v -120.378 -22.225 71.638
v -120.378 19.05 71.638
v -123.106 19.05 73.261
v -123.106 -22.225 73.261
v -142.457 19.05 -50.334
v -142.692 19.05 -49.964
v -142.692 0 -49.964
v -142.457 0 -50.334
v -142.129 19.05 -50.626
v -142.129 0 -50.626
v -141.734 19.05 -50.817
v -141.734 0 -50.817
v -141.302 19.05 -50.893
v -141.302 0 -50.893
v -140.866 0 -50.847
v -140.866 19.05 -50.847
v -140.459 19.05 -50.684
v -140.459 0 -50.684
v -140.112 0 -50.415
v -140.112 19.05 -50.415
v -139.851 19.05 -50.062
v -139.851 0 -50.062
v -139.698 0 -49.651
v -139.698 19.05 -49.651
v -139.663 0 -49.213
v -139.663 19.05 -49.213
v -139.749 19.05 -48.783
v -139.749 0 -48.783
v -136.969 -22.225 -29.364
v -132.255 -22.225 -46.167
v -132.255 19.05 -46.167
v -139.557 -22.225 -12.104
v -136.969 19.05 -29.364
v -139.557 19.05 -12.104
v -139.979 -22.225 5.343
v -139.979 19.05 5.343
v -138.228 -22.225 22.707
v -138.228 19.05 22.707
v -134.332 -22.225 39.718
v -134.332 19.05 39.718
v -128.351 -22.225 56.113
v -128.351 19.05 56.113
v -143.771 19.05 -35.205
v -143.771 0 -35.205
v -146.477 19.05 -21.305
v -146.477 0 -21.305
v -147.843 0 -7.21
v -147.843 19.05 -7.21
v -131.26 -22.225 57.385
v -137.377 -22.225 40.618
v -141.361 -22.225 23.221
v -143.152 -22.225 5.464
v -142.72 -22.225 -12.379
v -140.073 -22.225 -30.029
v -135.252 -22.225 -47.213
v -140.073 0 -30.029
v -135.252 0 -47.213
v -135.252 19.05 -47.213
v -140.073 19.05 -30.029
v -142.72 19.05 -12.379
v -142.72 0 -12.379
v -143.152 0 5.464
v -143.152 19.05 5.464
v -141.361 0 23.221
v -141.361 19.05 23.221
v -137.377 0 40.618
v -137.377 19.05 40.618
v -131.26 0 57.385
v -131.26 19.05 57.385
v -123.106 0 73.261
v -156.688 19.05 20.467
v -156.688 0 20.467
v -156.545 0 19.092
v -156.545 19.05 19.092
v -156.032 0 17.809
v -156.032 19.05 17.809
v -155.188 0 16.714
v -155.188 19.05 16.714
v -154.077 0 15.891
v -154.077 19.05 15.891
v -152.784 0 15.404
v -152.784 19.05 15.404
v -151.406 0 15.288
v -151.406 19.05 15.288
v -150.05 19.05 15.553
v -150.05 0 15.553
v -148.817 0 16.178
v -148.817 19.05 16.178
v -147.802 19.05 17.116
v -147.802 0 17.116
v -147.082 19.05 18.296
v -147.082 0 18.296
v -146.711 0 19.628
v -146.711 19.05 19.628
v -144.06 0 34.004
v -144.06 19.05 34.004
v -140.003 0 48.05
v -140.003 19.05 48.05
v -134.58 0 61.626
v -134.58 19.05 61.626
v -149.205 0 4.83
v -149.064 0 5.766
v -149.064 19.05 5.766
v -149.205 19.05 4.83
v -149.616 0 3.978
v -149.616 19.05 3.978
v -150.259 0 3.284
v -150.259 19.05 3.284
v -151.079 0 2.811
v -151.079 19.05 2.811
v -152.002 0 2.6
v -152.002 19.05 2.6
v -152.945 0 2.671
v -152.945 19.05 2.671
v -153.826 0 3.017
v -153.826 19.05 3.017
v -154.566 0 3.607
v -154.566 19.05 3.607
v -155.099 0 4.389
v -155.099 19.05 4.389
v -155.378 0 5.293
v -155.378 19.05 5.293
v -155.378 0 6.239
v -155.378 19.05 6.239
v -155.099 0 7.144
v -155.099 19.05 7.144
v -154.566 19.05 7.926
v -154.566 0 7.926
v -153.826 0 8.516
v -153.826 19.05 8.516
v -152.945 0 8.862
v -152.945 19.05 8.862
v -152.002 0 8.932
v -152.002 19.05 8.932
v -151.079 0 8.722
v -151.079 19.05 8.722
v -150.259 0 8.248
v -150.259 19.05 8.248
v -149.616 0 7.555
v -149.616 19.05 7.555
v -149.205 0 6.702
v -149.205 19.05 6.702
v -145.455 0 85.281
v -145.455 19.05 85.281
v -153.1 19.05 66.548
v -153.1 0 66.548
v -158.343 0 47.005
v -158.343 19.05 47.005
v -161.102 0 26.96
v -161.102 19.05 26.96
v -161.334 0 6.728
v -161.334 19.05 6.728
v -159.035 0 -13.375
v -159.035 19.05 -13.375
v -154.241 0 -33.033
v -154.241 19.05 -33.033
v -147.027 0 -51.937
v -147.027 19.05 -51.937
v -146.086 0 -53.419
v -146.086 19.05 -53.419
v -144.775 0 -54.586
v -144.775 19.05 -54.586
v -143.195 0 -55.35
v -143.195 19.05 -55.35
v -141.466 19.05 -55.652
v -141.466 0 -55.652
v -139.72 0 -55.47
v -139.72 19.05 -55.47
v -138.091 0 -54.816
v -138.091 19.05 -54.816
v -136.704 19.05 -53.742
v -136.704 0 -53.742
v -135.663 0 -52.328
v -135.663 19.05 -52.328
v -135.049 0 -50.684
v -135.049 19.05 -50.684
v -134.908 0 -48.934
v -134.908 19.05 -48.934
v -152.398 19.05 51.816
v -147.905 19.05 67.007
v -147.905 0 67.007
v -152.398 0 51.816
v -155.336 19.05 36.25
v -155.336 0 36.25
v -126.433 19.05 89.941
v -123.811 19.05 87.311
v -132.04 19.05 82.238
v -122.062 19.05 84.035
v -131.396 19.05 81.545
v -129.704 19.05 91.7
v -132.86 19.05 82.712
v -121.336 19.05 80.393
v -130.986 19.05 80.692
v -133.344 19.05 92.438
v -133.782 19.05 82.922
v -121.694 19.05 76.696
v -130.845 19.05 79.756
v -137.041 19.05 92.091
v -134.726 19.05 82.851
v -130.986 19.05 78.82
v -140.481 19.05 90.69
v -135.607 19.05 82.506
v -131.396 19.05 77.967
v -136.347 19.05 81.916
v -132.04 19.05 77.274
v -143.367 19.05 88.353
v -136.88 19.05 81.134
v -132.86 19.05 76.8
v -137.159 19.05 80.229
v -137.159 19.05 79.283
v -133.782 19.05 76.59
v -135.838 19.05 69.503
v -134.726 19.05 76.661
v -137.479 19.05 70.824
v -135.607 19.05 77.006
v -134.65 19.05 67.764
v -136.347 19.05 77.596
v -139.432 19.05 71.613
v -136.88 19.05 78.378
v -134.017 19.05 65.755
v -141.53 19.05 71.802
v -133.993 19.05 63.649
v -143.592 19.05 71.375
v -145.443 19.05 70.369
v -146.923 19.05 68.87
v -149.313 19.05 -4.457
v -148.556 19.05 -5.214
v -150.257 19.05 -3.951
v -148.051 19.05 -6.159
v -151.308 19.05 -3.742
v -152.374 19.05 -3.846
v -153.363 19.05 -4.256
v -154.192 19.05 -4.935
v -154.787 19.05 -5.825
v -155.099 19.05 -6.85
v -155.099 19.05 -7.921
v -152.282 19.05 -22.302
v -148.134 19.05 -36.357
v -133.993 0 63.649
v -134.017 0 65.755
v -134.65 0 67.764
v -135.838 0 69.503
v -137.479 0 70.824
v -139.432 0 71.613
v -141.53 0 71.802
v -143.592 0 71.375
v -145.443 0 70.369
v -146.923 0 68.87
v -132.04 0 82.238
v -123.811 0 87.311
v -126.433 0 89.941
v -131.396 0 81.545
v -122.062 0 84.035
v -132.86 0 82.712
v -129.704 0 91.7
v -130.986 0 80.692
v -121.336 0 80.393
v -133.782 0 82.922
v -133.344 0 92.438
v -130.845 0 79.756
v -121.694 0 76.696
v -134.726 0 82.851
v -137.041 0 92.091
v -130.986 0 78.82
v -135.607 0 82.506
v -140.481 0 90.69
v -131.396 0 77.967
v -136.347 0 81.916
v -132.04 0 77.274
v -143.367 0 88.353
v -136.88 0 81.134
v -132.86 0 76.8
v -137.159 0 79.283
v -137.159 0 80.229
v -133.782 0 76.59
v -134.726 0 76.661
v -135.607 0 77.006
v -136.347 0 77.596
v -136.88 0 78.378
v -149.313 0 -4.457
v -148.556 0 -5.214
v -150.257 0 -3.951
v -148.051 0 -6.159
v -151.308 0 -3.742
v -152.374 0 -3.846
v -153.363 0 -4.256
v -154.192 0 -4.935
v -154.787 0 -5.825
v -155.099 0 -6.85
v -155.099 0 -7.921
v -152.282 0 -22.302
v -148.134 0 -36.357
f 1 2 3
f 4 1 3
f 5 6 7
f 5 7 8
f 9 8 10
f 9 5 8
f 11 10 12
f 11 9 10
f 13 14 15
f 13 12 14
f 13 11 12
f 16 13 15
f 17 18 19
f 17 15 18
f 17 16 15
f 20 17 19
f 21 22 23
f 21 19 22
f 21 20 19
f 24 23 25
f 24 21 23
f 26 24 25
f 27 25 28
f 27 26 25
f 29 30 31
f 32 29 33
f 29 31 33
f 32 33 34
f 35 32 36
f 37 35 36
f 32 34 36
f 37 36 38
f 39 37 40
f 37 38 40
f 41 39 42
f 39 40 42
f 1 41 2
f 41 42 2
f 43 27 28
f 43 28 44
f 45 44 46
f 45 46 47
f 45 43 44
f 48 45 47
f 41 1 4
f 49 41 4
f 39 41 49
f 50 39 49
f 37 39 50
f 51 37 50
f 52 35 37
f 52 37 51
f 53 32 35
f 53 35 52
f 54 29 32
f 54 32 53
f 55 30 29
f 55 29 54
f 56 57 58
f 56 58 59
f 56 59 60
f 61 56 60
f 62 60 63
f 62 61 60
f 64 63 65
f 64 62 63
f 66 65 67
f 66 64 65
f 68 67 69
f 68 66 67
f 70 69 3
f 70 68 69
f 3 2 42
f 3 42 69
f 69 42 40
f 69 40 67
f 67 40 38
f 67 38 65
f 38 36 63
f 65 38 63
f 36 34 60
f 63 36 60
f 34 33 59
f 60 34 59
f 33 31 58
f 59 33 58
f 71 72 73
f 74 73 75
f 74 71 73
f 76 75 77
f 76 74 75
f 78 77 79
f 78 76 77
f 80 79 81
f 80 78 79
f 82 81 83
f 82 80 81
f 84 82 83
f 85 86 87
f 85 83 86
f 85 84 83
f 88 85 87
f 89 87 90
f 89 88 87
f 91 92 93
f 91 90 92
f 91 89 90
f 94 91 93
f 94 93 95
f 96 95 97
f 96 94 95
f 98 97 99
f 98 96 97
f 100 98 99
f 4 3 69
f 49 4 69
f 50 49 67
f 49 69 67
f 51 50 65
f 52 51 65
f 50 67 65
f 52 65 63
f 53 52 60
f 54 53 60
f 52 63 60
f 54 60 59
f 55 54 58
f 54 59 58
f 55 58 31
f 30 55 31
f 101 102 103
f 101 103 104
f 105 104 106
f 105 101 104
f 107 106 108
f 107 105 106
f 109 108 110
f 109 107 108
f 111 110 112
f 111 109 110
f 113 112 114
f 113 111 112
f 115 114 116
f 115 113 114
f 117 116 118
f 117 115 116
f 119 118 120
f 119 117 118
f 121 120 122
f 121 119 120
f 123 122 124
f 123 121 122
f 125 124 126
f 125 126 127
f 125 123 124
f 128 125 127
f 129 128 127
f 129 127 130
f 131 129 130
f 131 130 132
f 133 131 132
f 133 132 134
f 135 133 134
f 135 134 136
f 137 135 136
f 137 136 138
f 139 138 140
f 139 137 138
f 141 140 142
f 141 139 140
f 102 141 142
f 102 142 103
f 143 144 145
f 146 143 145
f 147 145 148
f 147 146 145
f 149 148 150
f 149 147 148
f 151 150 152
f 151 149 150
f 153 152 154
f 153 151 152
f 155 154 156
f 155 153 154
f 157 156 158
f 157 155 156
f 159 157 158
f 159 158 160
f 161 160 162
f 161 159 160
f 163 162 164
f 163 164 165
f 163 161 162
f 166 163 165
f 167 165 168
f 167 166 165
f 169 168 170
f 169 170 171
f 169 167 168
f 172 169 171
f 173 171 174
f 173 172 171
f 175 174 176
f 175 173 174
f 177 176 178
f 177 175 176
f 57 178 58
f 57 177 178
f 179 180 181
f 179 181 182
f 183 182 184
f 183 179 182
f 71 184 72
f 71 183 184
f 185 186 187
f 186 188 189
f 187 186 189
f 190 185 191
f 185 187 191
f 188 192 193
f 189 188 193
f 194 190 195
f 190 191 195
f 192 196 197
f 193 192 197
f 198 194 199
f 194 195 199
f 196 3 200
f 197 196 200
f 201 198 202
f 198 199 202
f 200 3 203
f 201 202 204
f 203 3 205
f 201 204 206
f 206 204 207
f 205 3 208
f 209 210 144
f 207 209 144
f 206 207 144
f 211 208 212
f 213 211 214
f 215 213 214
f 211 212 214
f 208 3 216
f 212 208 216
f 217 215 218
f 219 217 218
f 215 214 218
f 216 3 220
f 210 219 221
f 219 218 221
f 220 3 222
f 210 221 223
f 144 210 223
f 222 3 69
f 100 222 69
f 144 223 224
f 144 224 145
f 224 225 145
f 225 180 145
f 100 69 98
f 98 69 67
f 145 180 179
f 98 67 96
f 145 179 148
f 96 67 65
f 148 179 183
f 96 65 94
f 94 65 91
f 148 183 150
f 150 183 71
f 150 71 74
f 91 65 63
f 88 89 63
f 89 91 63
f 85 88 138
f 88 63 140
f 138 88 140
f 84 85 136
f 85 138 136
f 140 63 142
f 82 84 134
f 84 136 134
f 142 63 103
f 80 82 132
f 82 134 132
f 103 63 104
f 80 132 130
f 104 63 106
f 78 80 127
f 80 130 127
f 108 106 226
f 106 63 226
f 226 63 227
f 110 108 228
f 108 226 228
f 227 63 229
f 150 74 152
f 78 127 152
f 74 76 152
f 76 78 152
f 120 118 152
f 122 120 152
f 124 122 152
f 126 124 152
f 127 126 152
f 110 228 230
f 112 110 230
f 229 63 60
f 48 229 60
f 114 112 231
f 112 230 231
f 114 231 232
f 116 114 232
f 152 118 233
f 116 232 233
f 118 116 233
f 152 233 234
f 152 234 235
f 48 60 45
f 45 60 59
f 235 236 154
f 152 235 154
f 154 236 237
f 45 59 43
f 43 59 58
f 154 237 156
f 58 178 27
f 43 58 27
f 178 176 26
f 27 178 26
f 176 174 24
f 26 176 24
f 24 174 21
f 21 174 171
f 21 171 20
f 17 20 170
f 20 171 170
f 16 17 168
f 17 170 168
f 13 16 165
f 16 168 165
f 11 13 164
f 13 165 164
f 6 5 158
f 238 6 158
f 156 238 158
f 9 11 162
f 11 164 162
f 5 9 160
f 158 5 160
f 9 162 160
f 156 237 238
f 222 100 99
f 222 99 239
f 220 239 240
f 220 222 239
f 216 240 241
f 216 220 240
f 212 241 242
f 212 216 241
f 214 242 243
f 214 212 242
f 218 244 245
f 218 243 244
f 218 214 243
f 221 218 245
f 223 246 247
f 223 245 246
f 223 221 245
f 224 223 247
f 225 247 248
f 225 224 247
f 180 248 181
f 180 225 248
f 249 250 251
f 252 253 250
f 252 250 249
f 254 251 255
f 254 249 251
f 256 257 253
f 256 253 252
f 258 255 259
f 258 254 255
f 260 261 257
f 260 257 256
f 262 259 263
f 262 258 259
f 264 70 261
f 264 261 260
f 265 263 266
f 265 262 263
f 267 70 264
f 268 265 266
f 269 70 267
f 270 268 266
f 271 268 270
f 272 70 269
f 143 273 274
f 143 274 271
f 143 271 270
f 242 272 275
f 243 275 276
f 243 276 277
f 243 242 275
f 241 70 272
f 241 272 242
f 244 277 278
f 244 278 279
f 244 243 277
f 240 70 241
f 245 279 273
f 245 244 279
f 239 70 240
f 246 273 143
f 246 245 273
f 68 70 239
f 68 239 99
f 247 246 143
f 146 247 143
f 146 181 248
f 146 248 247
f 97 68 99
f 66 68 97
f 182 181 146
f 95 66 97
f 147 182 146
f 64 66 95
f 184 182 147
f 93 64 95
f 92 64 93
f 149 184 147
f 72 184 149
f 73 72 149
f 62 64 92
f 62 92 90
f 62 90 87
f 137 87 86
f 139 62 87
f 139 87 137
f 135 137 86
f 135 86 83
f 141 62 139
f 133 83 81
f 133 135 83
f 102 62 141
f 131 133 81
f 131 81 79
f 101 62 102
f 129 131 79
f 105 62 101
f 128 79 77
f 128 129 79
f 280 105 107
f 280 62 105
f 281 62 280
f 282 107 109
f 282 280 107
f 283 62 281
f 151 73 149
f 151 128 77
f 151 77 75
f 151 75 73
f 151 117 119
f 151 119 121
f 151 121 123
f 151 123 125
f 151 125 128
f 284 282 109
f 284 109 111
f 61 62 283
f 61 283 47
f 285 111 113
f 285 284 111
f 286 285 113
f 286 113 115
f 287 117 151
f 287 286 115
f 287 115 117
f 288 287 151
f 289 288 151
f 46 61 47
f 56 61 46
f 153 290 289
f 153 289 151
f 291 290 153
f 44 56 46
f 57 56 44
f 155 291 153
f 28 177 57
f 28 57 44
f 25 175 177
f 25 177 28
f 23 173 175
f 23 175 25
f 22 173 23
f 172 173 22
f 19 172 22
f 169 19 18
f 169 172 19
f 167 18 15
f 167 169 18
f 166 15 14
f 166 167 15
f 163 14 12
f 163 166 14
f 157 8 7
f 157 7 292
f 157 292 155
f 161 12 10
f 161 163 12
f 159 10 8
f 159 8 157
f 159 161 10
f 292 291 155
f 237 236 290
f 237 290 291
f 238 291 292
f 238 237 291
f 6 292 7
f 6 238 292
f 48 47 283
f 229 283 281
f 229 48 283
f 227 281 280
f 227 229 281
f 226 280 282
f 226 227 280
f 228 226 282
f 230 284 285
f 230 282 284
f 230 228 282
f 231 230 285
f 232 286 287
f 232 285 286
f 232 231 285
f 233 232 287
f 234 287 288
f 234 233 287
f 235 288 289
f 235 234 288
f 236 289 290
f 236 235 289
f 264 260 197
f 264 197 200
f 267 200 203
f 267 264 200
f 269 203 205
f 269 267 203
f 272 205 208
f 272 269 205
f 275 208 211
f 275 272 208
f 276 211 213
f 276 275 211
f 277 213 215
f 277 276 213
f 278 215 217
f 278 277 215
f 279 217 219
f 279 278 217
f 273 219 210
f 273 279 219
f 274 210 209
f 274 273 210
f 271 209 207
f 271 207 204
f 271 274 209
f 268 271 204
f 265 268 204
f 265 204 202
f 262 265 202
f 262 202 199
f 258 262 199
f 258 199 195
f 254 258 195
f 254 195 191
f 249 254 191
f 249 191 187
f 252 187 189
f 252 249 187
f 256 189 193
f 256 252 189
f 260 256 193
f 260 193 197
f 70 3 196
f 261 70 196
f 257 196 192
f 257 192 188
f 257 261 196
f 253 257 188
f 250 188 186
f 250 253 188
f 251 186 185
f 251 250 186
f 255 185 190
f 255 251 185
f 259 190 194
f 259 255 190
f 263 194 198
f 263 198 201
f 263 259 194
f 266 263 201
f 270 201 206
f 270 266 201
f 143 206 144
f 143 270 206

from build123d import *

# Parameters (mm, degrees)
SKETCH1_R           = 3.175
BOSS_EXTRUDE1_DEPTH = 19.05
CUT_EXTRUDE1_DEPTH  = 20.05
CUT_EXTRUDE2_DEPTH  = 20.05
BOSS_EXTRUDE2_DEPTH = 41.275


with BuildPart() as part:
    # Sketch1 → Boss-Extrude1 (new body)
    with BuildSketch(Plane(origin=(0, 0, 0), x_dir=(1, 0, 0), z_dir=(0, 1, 0))):
        with BuildLine():
            ThreePointArc((-135.252327308, 47.213234308), (-142.533412468, -14.370381558), (-123.105955958, -73.261211726))
            ThreePointArc((-123.105955958, -73.261211726), (-128.003817931, -90.940825055), (-145.454595651, -85.28148443))
            ThreePointArc((-145.454595651, -85.28148443), (-161.535072193, -16.847470136), (-147.026852029, 51.937030923))
            ThreePointArc((-147.026852029, 51.937030923), (-138.883189966, 55.199429393), (-135.252327308, 47.213234308))
        make_face()
        with Locations((-134.019604536, -79.756)):
            Circle(SKETCH1_R, mode=Mode.SUBTRACT)
        with Locations((-152.238831544, -5.766137402)):
            Circle(SKETCH1_R, mode=Mode.SUBTRACT)
    extrude(amount=BOSS_EXTRUDE1_DEPTH)

    # Sketch2 → Cut-Extrude1 (cut, through all)
    with BuildSketch(Plane(origin=(0, 19.05, 0), x_dir=(1, 0, 0), z_dir=(0, 1, 0))):
        with BuildLine():
            ThreePointArc((-142.692378944, 49.963772368), (-140.656463428, 50.779371986), (-139.748747763, 48.782823215))
            ThreePointArc((-139.748747763, 48.782823215), (-145.29042963, 28.287230336), (-147.842813364, 7.209637907))
            ThreePointArc((-147.842813364, 7.209637907), (-151.84450431, 3.75488539), (-155.099163962, 7.920942989))
            ThreePointArc((-155.099163962, 7.920942989), (-150.372373234, 29.37810097), (-142.692378944, 49.963772368))
        make_face()
    extrude(amount=-CUT_EXTRUDE1_DEPTH, mode=Mode.SUBTRACT)

    # Sketch3 → Cut-Extrude2 (cut, through all)
    with BuildSketch(Plane(origin=(0, 19.05, 0), x_dir=(1, 0, 0), z_dir=(0, 1, 0))):
        with BuildLine():
            ThreePointArc((-146.711397823, -19.627584953), (-142.204584096, -41.077154288), (-134.579739329, -61.626050533))
            ThreePointArc((-134.579739329, -61.626050533), (-138.426335153, -71.290308551), (-147.905040723, -67.006814278))
            ThreePointArc((-147.905040723, -67.006814278), (-154.06386253, -44.070471811), (-156.687709885, -20.467033144))
            ThreePointArc((-156.687709885, -20.467033144), (-152.099180348, -15.298000327), (-146.711397823, -19.627584953))
        make_face()
    extrude(amount=-CUT_EXTRUDE2_DEPTH, mode=Mode.SUBTRACT)


with BuildPart() as body_2:
    # Sketch4 → Boss-Extrude2 (new body)
    with BuildSketch(Plane(origin=(0, 19.05, 0), x_dir=(1, 0, 0), z_dir=(0, 1, 0))):
        with BuildLine():
            Line((-135.252327308, 47.213234308), (-132.254713671, 46.166841704))
            ThreePointArc((-132.254713671, 46.166841704), (-139.374427263, -14.051889059), (-120.377543814, -71.637514658))
            Line((-120.377543814, -71.637514658), (-123.105955958, -73.261211726))
            ThreePointArc((-123.105955958, -73.261211726), (-142.533412468, -14.370381558), (-135.252327308, 47.213234308))
        make_face()
    extrude(amount=-BOSS_EXTRUDE2_DEPTH)


solid = Compound([part.part, body_2.part])
